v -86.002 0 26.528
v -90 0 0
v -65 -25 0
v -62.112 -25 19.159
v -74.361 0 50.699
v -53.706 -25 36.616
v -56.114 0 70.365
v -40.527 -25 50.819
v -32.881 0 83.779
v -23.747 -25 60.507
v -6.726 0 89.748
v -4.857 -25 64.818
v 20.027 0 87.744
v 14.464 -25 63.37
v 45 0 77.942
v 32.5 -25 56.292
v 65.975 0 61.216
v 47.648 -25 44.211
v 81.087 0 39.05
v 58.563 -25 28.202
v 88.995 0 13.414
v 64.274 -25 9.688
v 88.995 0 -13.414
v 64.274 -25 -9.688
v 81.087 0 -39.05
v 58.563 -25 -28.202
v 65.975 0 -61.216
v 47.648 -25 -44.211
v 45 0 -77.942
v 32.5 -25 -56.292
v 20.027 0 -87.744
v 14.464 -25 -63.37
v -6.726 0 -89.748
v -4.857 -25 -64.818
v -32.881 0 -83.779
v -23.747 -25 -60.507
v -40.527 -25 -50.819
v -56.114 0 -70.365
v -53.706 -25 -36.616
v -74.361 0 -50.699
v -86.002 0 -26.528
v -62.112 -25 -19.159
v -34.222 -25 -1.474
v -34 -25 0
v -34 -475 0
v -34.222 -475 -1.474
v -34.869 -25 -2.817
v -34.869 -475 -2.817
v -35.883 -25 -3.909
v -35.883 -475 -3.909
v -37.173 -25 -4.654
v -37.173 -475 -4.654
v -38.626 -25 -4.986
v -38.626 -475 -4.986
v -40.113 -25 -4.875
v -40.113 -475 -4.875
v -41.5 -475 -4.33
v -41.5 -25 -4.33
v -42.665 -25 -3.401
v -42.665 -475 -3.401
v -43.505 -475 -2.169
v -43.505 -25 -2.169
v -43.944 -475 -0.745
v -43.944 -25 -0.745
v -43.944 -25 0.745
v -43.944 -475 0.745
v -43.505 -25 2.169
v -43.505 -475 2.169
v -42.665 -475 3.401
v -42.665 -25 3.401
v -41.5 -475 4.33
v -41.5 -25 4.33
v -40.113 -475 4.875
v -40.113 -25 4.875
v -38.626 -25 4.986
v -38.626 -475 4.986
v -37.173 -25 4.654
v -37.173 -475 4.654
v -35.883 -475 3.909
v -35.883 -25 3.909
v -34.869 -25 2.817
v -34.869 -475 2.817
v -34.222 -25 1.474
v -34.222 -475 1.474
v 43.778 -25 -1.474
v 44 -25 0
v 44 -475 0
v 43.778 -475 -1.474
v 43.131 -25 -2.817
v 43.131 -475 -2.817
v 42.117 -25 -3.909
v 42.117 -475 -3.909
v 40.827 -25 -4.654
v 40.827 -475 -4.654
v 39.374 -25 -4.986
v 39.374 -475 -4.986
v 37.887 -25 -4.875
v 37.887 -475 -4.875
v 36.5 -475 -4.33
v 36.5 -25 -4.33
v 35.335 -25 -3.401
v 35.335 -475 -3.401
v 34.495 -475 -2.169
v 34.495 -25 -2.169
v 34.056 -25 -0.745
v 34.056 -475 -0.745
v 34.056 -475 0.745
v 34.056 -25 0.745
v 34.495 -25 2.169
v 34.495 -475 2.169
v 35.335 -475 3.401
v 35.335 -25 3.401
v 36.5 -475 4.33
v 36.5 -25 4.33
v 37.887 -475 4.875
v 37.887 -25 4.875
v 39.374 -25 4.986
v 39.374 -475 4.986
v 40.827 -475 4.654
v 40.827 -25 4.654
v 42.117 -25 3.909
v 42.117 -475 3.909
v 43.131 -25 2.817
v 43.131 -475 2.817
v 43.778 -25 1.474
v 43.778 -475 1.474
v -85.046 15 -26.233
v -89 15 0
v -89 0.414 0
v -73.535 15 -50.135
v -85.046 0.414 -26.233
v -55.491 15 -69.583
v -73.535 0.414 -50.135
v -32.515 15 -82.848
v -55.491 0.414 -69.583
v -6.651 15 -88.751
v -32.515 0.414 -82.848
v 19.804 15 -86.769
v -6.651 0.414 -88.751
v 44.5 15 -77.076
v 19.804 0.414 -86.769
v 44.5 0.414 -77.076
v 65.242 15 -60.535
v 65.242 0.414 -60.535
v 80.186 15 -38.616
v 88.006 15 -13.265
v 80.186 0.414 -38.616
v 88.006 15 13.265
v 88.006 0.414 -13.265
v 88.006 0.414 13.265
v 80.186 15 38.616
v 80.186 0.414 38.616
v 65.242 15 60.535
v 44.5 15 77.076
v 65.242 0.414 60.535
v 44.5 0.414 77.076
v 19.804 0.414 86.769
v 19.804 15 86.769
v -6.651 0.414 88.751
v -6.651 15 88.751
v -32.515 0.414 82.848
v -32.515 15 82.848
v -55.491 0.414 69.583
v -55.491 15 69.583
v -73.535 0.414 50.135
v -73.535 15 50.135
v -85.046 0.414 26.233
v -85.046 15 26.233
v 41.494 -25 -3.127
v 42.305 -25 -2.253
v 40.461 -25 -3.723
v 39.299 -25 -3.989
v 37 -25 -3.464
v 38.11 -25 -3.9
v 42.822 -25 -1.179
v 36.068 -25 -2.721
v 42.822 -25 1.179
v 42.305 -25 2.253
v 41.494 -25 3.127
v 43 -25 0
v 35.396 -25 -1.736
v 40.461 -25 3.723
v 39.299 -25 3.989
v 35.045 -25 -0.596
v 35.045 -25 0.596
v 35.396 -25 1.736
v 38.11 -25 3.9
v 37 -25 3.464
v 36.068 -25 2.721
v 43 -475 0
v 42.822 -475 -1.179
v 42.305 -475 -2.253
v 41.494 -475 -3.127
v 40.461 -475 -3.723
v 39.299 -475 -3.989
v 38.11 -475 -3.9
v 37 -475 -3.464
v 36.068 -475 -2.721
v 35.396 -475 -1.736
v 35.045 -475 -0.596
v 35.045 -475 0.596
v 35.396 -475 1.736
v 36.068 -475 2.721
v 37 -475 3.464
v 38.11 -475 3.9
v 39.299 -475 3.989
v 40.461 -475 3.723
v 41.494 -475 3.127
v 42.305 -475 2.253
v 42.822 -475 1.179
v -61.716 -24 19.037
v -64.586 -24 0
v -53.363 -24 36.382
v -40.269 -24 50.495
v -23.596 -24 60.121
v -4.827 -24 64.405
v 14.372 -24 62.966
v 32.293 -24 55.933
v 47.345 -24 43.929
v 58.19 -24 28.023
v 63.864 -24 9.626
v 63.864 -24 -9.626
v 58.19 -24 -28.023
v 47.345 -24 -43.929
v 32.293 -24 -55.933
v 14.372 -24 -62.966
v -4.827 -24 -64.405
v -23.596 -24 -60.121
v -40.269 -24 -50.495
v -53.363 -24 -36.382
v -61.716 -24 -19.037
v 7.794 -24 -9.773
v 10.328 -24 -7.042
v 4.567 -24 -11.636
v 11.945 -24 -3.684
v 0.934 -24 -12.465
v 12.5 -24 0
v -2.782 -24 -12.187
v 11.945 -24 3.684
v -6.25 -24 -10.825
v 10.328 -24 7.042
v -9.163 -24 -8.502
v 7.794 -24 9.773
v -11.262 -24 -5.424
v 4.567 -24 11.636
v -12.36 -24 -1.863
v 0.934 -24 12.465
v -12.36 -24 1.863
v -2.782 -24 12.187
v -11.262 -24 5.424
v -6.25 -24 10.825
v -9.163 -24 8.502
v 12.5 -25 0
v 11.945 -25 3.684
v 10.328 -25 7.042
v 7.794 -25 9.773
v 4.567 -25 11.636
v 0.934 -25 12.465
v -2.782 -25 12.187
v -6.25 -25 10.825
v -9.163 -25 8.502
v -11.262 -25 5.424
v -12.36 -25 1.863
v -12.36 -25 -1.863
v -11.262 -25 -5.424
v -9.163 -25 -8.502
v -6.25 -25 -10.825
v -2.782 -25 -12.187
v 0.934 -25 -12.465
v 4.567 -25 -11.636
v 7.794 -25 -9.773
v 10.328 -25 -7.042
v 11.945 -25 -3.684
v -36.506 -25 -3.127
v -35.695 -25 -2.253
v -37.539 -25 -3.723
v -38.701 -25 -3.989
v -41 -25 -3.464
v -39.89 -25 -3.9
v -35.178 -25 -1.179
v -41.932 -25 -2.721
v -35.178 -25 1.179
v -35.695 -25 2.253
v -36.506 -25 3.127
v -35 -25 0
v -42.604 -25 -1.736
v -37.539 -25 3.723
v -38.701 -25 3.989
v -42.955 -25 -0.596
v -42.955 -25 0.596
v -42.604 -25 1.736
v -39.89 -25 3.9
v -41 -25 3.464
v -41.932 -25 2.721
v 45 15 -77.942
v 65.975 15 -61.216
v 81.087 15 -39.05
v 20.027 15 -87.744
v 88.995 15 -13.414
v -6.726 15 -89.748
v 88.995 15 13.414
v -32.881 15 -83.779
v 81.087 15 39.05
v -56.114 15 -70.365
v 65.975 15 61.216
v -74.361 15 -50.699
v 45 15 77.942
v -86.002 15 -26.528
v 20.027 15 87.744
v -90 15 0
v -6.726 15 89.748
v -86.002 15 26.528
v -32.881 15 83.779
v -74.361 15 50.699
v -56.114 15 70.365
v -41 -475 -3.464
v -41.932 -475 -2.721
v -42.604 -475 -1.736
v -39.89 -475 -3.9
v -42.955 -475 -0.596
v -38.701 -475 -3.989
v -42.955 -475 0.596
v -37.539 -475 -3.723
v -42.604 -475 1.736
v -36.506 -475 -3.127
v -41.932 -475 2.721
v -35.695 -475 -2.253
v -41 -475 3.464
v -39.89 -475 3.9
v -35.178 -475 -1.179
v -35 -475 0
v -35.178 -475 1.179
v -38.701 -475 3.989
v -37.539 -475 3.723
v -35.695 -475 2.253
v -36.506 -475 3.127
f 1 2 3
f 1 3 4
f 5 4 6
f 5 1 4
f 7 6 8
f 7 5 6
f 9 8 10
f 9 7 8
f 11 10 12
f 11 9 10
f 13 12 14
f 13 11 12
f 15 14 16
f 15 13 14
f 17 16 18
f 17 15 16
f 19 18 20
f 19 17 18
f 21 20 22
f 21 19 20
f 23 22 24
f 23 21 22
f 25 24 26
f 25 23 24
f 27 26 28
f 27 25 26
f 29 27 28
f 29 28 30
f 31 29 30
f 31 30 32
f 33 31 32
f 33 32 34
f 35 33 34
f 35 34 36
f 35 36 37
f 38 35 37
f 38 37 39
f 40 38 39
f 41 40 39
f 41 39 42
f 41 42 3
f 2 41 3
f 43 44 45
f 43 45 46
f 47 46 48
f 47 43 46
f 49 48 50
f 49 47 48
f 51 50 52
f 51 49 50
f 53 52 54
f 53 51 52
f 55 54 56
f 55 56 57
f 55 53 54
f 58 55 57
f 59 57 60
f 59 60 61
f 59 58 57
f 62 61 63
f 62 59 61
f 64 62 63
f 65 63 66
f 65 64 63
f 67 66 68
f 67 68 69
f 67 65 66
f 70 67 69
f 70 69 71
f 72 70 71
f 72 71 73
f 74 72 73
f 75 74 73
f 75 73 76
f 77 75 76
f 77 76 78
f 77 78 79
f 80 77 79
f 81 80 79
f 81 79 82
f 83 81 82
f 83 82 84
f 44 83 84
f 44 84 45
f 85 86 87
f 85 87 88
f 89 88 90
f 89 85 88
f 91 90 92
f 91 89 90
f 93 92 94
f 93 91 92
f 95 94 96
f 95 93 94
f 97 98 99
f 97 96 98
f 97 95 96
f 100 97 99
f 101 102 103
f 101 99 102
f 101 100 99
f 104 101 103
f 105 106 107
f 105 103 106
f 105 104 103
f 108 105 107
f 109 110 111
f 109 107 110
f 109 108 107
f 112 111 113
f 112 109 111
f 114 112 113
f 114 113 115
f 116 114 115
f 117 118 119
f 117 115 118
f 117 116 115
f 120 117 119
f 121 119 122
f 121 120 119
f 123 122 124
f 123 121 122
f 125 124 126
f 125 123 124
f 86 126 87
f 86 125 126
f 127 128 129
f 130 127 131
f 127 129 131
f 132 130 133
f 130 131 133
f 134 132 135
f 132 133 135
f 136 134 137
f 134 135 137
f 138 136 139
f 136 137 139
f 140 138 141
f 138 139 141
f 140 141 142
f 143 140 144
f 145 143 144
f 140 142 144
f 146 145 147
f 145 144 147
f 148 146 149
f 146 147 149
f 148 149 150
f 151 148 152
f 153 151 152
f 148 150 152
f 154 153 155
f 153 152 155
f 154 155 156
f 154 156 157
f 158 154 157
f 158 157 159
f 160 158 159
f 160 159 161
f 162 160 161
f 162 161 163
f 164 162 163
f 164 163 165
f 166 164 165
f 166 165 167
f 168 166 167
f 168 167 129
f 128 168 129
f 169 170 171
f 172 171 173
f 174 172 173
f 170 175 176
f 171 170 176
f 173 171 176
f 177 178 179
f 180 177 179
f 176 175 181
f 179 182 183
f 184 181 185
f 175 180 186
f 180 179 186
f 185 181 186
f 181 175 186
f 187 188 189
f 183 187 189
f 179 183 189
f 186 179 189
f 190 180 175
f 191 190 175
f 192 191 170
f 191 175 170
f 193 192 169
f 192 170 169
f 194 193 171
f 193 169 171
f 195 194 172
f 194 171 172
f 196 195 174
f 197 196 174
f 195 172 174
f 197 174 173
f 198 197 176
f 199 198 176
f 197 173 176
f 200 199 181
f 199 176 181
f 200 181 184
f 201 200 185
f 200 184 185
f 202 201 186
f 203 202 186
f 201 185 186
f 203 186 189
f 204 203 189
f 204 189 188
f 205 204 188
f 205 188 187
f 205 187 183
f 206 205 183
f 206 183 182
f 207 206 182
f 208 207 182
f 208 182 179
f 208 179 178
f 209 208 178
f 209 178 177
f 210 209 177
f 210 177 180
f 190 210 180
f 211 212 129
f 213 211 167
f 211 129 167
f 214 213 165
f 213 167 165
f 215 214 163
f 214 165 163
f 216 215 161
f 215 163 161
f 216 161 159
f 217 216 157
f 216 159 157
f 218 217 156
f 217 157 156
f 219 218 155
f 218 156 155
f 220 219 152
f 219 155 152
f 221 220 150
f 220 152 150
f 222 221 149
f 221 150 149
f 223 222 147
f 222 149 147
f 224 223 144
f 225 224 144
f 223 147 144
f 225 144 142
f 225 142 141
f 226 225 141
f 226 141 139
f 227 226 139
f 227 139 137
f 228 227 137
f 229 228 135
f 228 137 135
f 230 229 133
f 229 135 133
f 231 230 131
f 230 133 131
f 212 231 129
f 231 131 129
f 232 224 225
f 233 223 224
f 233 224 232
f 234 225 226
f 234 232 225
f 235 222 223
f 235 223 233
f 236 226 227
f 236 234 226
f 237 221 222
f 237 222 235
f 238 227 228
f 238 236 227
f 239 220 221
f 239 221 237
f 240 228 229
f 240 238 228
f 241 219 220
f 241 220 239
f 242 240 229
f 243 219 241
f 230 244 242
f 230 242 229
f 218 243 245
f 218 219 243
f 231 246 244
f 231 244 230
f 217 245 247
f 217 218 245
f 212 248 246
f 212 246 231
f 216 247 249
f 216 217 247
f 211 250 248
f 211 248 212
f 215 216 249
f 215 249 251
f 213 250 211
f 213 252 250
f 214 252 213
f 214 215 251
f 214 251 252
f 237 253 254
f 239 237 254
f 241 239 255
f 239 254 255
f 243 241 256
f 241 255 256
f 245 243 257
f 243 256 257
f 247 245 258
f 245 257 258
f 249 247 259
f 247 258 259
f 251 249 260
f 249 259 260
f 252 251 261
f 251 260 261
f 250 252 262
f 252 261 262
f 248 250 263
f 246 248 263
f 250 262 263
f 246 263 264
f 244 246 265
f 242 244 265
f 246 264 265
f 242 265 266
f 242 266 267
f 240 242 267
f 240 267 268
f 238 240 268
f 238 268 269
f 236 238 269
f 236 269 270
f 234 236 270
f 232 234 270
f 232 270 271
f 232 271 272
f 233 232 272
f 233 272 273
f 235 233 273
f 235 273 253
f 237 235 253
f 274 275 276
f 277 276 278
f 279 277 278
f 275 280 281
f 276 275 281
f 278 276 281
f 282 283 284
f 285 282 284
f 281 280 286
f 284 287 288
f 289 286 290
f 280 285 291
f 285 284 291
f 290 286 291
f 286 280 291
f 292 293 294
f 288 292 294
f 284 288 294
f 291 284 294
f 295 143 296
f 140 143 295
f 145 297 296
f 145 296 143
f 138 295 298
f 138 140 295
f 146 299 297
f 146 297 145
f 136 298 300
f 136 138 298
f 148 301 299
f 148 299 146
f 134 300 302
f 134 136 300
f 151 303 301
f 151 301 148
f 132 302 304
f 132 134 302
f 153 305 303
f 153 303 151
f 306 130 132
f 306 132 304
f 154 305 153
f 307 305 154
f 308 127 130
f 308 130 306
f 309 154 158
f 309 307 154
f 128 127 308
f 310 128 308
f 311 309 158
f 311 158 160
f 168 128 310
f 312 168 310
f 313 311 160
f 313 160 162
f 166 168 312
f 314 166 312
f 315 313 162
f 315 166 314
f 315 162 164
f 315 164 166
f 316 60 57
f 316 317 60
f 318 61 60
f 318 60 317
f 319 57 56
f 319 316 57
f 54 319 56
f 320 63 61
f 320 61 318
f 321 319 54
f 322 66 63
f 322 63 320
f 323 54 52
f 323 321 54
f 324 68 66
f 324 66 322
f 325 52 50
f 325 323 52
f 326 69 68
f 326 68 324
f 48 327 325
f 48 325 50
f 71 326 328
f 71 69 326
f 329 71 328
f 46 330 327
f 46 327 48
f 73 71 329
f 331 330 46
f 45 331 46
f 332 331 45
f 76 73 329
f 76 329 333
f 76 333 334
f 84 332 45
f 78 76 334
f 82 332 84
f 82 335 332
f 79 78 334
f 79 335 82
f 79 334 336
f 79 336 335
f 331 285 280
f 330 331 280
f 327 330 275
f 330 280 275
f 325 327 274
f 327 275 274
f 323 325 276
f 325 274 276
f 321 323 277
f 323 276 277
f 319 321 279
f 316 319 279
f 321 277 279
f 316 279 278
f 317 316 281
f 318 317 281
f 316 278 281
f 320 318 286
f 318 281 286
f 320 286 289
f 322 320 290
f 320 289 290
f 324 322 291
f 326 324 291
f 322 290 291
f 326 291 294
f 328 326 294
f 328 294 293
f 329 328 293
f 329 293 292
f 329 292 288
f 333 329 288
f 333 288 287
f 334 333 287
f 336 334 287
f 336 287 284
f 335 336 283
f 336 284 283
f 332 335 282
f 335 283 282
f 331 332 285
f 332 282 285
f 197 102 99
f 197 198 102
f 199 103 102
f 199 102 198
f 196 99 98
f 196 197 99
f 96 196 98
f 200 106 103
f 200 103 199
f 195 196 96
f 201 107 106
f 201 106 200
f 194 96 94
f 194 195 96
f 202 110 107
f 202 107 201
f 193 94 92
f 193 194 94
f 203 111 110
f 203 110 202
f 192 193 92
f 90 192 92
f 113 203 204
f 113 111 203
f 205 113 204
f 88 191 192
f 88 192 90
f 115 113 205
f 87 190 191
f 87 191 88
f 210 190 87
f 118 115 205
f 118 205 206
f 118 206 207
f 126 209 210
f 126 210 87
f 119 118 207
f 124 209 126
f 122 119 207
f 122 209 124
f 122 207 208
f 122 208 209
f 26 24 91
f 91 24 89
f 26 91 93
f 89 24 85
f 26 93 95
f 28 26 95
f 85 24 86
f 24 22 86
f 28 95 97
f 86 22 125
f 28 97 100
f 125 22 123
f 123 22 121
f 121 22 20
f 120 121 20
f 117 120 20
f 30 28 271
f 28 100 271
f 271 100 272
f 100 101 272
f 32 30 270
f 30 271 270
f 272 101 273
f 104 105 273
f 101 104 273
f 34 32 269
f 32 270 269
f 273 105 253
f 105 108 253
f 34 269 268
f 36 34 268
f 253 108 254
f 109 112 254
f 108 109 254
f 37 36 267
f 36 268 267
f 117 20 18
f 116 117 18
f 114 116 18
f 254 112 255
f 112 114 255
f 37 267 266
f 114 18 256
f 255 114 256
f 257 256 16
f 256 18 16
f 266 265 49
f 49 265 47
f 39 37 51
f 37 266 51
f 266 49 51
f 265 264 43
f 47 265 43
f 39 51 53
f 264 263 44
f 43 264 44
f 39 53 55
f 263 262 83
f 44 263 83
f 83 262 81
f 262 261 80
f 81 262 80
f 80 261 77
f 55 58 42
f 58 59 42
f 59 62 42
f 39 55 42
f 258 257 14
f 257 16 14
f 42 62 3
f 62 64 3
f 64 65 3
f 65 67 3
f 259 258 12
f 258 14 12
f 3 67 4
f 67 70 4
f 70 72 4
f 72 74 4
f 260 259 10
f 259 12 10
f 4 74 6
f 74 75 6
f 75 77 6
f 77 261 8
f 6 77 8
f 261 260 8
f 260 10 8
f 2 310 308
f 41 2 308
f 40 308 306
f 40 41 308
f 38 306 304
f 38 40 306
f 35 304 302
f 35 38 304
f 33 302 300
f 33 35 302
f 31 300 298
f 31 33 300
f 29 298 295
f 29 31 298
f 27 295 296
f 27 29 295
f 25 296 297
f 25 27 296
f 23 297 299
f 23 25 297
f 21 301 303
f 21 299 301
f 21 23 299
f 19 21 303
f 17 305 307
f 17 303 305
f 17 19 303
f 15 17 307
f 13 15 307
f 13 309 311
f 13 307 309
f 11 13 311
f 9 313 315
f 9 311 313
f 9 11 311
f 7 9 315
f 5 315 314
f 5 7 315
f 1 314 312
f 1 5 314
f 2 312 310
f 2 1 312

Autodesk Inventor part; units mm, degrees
ref_plane "YZ Plane" through (0, 0, 0) normal (1, 0, 0) x (0, 1, 0)
ref_plane "XZ Plane" through (0, 0, 0) normal (0, 1, 0) x (-1, 0, 0)
ref_plane "XY Plane" through (0, 0, 0) normal (0, 0, 1) x (1, 0, 0)
sketch "Boceto1" plane through (0, 0, 0) normal (0, 1, 0) x (-1, 0, 0)
  circle A0 centre (0, 0) radius 90
  dimension "d0" = 180
extrude "Extrusión1" add sketch "Boceto1" along normal blind 15
extrude "Extrusión2" add sketch "Boceto1" against normal blind 25 draft -45
shell "Vaciado1" thickness 1 removed faces 1 at (19.6237, 15, 24.7178)
sketch "Boceto2" plane through (0, -25, 0) normal (0, -1, 0) x (1, 0, 0)
  circle A0 centre (0, 0) radius 12.5
  dimension "d6" = 25
extrude "Extrusión3" cut sketch "Boceto2" against normal blind 25
sketch "Boceto3" plane through (0, -25, 0) normal (0, -1, 0) x (1, 0, 0)
  circle A0 centre (0, 0) radius 12.5 projected
  circle A1 centre (0, 0) radius 45
  circle A2 centre (0, 0) radius 44
  line L0 (44, 0) -> (41.5, 0)
  circle A3 centre (41.5, 0) radius 2.5
  line L1 (-44, 0) -> (-41.5, 0)
  circle A4 centre (-41.5, 0) radius 2.5
  circle A5 centre (0, 41.5) radius 2.5
  circle A6 centre (-41.5, 0) radius 2.5
  circle A7 centre (0, -41.5) radius 2.5
  line L2 (44, 0) -> (39, 0)
  circle A8 centre (39, 0) radius 5
  circle A9 centre (-39, 0) radius 5
  point P0 (0, 44)
  point P1 (-44, 0)
  point P2 (0, -44)
  dimension "d9" = 90
  dimension "d10" = 88
  dimension "d11" = 2.5
  dimension "d12" = 2.5
  dimension "d13" = 5
  dimension "d16" = 360
extrude "Extrusión4" add sketch "Boceto3" along normal blind 450 contours A4 | A9 | A3 L2 L0 | L0 L2 A3 | A8
shell "Vaciado2" thickness 1 removed faces 2 at (-39.591, -475, 0.7606) at (39.8768, -475, -0.3989)
properties part number "base"
